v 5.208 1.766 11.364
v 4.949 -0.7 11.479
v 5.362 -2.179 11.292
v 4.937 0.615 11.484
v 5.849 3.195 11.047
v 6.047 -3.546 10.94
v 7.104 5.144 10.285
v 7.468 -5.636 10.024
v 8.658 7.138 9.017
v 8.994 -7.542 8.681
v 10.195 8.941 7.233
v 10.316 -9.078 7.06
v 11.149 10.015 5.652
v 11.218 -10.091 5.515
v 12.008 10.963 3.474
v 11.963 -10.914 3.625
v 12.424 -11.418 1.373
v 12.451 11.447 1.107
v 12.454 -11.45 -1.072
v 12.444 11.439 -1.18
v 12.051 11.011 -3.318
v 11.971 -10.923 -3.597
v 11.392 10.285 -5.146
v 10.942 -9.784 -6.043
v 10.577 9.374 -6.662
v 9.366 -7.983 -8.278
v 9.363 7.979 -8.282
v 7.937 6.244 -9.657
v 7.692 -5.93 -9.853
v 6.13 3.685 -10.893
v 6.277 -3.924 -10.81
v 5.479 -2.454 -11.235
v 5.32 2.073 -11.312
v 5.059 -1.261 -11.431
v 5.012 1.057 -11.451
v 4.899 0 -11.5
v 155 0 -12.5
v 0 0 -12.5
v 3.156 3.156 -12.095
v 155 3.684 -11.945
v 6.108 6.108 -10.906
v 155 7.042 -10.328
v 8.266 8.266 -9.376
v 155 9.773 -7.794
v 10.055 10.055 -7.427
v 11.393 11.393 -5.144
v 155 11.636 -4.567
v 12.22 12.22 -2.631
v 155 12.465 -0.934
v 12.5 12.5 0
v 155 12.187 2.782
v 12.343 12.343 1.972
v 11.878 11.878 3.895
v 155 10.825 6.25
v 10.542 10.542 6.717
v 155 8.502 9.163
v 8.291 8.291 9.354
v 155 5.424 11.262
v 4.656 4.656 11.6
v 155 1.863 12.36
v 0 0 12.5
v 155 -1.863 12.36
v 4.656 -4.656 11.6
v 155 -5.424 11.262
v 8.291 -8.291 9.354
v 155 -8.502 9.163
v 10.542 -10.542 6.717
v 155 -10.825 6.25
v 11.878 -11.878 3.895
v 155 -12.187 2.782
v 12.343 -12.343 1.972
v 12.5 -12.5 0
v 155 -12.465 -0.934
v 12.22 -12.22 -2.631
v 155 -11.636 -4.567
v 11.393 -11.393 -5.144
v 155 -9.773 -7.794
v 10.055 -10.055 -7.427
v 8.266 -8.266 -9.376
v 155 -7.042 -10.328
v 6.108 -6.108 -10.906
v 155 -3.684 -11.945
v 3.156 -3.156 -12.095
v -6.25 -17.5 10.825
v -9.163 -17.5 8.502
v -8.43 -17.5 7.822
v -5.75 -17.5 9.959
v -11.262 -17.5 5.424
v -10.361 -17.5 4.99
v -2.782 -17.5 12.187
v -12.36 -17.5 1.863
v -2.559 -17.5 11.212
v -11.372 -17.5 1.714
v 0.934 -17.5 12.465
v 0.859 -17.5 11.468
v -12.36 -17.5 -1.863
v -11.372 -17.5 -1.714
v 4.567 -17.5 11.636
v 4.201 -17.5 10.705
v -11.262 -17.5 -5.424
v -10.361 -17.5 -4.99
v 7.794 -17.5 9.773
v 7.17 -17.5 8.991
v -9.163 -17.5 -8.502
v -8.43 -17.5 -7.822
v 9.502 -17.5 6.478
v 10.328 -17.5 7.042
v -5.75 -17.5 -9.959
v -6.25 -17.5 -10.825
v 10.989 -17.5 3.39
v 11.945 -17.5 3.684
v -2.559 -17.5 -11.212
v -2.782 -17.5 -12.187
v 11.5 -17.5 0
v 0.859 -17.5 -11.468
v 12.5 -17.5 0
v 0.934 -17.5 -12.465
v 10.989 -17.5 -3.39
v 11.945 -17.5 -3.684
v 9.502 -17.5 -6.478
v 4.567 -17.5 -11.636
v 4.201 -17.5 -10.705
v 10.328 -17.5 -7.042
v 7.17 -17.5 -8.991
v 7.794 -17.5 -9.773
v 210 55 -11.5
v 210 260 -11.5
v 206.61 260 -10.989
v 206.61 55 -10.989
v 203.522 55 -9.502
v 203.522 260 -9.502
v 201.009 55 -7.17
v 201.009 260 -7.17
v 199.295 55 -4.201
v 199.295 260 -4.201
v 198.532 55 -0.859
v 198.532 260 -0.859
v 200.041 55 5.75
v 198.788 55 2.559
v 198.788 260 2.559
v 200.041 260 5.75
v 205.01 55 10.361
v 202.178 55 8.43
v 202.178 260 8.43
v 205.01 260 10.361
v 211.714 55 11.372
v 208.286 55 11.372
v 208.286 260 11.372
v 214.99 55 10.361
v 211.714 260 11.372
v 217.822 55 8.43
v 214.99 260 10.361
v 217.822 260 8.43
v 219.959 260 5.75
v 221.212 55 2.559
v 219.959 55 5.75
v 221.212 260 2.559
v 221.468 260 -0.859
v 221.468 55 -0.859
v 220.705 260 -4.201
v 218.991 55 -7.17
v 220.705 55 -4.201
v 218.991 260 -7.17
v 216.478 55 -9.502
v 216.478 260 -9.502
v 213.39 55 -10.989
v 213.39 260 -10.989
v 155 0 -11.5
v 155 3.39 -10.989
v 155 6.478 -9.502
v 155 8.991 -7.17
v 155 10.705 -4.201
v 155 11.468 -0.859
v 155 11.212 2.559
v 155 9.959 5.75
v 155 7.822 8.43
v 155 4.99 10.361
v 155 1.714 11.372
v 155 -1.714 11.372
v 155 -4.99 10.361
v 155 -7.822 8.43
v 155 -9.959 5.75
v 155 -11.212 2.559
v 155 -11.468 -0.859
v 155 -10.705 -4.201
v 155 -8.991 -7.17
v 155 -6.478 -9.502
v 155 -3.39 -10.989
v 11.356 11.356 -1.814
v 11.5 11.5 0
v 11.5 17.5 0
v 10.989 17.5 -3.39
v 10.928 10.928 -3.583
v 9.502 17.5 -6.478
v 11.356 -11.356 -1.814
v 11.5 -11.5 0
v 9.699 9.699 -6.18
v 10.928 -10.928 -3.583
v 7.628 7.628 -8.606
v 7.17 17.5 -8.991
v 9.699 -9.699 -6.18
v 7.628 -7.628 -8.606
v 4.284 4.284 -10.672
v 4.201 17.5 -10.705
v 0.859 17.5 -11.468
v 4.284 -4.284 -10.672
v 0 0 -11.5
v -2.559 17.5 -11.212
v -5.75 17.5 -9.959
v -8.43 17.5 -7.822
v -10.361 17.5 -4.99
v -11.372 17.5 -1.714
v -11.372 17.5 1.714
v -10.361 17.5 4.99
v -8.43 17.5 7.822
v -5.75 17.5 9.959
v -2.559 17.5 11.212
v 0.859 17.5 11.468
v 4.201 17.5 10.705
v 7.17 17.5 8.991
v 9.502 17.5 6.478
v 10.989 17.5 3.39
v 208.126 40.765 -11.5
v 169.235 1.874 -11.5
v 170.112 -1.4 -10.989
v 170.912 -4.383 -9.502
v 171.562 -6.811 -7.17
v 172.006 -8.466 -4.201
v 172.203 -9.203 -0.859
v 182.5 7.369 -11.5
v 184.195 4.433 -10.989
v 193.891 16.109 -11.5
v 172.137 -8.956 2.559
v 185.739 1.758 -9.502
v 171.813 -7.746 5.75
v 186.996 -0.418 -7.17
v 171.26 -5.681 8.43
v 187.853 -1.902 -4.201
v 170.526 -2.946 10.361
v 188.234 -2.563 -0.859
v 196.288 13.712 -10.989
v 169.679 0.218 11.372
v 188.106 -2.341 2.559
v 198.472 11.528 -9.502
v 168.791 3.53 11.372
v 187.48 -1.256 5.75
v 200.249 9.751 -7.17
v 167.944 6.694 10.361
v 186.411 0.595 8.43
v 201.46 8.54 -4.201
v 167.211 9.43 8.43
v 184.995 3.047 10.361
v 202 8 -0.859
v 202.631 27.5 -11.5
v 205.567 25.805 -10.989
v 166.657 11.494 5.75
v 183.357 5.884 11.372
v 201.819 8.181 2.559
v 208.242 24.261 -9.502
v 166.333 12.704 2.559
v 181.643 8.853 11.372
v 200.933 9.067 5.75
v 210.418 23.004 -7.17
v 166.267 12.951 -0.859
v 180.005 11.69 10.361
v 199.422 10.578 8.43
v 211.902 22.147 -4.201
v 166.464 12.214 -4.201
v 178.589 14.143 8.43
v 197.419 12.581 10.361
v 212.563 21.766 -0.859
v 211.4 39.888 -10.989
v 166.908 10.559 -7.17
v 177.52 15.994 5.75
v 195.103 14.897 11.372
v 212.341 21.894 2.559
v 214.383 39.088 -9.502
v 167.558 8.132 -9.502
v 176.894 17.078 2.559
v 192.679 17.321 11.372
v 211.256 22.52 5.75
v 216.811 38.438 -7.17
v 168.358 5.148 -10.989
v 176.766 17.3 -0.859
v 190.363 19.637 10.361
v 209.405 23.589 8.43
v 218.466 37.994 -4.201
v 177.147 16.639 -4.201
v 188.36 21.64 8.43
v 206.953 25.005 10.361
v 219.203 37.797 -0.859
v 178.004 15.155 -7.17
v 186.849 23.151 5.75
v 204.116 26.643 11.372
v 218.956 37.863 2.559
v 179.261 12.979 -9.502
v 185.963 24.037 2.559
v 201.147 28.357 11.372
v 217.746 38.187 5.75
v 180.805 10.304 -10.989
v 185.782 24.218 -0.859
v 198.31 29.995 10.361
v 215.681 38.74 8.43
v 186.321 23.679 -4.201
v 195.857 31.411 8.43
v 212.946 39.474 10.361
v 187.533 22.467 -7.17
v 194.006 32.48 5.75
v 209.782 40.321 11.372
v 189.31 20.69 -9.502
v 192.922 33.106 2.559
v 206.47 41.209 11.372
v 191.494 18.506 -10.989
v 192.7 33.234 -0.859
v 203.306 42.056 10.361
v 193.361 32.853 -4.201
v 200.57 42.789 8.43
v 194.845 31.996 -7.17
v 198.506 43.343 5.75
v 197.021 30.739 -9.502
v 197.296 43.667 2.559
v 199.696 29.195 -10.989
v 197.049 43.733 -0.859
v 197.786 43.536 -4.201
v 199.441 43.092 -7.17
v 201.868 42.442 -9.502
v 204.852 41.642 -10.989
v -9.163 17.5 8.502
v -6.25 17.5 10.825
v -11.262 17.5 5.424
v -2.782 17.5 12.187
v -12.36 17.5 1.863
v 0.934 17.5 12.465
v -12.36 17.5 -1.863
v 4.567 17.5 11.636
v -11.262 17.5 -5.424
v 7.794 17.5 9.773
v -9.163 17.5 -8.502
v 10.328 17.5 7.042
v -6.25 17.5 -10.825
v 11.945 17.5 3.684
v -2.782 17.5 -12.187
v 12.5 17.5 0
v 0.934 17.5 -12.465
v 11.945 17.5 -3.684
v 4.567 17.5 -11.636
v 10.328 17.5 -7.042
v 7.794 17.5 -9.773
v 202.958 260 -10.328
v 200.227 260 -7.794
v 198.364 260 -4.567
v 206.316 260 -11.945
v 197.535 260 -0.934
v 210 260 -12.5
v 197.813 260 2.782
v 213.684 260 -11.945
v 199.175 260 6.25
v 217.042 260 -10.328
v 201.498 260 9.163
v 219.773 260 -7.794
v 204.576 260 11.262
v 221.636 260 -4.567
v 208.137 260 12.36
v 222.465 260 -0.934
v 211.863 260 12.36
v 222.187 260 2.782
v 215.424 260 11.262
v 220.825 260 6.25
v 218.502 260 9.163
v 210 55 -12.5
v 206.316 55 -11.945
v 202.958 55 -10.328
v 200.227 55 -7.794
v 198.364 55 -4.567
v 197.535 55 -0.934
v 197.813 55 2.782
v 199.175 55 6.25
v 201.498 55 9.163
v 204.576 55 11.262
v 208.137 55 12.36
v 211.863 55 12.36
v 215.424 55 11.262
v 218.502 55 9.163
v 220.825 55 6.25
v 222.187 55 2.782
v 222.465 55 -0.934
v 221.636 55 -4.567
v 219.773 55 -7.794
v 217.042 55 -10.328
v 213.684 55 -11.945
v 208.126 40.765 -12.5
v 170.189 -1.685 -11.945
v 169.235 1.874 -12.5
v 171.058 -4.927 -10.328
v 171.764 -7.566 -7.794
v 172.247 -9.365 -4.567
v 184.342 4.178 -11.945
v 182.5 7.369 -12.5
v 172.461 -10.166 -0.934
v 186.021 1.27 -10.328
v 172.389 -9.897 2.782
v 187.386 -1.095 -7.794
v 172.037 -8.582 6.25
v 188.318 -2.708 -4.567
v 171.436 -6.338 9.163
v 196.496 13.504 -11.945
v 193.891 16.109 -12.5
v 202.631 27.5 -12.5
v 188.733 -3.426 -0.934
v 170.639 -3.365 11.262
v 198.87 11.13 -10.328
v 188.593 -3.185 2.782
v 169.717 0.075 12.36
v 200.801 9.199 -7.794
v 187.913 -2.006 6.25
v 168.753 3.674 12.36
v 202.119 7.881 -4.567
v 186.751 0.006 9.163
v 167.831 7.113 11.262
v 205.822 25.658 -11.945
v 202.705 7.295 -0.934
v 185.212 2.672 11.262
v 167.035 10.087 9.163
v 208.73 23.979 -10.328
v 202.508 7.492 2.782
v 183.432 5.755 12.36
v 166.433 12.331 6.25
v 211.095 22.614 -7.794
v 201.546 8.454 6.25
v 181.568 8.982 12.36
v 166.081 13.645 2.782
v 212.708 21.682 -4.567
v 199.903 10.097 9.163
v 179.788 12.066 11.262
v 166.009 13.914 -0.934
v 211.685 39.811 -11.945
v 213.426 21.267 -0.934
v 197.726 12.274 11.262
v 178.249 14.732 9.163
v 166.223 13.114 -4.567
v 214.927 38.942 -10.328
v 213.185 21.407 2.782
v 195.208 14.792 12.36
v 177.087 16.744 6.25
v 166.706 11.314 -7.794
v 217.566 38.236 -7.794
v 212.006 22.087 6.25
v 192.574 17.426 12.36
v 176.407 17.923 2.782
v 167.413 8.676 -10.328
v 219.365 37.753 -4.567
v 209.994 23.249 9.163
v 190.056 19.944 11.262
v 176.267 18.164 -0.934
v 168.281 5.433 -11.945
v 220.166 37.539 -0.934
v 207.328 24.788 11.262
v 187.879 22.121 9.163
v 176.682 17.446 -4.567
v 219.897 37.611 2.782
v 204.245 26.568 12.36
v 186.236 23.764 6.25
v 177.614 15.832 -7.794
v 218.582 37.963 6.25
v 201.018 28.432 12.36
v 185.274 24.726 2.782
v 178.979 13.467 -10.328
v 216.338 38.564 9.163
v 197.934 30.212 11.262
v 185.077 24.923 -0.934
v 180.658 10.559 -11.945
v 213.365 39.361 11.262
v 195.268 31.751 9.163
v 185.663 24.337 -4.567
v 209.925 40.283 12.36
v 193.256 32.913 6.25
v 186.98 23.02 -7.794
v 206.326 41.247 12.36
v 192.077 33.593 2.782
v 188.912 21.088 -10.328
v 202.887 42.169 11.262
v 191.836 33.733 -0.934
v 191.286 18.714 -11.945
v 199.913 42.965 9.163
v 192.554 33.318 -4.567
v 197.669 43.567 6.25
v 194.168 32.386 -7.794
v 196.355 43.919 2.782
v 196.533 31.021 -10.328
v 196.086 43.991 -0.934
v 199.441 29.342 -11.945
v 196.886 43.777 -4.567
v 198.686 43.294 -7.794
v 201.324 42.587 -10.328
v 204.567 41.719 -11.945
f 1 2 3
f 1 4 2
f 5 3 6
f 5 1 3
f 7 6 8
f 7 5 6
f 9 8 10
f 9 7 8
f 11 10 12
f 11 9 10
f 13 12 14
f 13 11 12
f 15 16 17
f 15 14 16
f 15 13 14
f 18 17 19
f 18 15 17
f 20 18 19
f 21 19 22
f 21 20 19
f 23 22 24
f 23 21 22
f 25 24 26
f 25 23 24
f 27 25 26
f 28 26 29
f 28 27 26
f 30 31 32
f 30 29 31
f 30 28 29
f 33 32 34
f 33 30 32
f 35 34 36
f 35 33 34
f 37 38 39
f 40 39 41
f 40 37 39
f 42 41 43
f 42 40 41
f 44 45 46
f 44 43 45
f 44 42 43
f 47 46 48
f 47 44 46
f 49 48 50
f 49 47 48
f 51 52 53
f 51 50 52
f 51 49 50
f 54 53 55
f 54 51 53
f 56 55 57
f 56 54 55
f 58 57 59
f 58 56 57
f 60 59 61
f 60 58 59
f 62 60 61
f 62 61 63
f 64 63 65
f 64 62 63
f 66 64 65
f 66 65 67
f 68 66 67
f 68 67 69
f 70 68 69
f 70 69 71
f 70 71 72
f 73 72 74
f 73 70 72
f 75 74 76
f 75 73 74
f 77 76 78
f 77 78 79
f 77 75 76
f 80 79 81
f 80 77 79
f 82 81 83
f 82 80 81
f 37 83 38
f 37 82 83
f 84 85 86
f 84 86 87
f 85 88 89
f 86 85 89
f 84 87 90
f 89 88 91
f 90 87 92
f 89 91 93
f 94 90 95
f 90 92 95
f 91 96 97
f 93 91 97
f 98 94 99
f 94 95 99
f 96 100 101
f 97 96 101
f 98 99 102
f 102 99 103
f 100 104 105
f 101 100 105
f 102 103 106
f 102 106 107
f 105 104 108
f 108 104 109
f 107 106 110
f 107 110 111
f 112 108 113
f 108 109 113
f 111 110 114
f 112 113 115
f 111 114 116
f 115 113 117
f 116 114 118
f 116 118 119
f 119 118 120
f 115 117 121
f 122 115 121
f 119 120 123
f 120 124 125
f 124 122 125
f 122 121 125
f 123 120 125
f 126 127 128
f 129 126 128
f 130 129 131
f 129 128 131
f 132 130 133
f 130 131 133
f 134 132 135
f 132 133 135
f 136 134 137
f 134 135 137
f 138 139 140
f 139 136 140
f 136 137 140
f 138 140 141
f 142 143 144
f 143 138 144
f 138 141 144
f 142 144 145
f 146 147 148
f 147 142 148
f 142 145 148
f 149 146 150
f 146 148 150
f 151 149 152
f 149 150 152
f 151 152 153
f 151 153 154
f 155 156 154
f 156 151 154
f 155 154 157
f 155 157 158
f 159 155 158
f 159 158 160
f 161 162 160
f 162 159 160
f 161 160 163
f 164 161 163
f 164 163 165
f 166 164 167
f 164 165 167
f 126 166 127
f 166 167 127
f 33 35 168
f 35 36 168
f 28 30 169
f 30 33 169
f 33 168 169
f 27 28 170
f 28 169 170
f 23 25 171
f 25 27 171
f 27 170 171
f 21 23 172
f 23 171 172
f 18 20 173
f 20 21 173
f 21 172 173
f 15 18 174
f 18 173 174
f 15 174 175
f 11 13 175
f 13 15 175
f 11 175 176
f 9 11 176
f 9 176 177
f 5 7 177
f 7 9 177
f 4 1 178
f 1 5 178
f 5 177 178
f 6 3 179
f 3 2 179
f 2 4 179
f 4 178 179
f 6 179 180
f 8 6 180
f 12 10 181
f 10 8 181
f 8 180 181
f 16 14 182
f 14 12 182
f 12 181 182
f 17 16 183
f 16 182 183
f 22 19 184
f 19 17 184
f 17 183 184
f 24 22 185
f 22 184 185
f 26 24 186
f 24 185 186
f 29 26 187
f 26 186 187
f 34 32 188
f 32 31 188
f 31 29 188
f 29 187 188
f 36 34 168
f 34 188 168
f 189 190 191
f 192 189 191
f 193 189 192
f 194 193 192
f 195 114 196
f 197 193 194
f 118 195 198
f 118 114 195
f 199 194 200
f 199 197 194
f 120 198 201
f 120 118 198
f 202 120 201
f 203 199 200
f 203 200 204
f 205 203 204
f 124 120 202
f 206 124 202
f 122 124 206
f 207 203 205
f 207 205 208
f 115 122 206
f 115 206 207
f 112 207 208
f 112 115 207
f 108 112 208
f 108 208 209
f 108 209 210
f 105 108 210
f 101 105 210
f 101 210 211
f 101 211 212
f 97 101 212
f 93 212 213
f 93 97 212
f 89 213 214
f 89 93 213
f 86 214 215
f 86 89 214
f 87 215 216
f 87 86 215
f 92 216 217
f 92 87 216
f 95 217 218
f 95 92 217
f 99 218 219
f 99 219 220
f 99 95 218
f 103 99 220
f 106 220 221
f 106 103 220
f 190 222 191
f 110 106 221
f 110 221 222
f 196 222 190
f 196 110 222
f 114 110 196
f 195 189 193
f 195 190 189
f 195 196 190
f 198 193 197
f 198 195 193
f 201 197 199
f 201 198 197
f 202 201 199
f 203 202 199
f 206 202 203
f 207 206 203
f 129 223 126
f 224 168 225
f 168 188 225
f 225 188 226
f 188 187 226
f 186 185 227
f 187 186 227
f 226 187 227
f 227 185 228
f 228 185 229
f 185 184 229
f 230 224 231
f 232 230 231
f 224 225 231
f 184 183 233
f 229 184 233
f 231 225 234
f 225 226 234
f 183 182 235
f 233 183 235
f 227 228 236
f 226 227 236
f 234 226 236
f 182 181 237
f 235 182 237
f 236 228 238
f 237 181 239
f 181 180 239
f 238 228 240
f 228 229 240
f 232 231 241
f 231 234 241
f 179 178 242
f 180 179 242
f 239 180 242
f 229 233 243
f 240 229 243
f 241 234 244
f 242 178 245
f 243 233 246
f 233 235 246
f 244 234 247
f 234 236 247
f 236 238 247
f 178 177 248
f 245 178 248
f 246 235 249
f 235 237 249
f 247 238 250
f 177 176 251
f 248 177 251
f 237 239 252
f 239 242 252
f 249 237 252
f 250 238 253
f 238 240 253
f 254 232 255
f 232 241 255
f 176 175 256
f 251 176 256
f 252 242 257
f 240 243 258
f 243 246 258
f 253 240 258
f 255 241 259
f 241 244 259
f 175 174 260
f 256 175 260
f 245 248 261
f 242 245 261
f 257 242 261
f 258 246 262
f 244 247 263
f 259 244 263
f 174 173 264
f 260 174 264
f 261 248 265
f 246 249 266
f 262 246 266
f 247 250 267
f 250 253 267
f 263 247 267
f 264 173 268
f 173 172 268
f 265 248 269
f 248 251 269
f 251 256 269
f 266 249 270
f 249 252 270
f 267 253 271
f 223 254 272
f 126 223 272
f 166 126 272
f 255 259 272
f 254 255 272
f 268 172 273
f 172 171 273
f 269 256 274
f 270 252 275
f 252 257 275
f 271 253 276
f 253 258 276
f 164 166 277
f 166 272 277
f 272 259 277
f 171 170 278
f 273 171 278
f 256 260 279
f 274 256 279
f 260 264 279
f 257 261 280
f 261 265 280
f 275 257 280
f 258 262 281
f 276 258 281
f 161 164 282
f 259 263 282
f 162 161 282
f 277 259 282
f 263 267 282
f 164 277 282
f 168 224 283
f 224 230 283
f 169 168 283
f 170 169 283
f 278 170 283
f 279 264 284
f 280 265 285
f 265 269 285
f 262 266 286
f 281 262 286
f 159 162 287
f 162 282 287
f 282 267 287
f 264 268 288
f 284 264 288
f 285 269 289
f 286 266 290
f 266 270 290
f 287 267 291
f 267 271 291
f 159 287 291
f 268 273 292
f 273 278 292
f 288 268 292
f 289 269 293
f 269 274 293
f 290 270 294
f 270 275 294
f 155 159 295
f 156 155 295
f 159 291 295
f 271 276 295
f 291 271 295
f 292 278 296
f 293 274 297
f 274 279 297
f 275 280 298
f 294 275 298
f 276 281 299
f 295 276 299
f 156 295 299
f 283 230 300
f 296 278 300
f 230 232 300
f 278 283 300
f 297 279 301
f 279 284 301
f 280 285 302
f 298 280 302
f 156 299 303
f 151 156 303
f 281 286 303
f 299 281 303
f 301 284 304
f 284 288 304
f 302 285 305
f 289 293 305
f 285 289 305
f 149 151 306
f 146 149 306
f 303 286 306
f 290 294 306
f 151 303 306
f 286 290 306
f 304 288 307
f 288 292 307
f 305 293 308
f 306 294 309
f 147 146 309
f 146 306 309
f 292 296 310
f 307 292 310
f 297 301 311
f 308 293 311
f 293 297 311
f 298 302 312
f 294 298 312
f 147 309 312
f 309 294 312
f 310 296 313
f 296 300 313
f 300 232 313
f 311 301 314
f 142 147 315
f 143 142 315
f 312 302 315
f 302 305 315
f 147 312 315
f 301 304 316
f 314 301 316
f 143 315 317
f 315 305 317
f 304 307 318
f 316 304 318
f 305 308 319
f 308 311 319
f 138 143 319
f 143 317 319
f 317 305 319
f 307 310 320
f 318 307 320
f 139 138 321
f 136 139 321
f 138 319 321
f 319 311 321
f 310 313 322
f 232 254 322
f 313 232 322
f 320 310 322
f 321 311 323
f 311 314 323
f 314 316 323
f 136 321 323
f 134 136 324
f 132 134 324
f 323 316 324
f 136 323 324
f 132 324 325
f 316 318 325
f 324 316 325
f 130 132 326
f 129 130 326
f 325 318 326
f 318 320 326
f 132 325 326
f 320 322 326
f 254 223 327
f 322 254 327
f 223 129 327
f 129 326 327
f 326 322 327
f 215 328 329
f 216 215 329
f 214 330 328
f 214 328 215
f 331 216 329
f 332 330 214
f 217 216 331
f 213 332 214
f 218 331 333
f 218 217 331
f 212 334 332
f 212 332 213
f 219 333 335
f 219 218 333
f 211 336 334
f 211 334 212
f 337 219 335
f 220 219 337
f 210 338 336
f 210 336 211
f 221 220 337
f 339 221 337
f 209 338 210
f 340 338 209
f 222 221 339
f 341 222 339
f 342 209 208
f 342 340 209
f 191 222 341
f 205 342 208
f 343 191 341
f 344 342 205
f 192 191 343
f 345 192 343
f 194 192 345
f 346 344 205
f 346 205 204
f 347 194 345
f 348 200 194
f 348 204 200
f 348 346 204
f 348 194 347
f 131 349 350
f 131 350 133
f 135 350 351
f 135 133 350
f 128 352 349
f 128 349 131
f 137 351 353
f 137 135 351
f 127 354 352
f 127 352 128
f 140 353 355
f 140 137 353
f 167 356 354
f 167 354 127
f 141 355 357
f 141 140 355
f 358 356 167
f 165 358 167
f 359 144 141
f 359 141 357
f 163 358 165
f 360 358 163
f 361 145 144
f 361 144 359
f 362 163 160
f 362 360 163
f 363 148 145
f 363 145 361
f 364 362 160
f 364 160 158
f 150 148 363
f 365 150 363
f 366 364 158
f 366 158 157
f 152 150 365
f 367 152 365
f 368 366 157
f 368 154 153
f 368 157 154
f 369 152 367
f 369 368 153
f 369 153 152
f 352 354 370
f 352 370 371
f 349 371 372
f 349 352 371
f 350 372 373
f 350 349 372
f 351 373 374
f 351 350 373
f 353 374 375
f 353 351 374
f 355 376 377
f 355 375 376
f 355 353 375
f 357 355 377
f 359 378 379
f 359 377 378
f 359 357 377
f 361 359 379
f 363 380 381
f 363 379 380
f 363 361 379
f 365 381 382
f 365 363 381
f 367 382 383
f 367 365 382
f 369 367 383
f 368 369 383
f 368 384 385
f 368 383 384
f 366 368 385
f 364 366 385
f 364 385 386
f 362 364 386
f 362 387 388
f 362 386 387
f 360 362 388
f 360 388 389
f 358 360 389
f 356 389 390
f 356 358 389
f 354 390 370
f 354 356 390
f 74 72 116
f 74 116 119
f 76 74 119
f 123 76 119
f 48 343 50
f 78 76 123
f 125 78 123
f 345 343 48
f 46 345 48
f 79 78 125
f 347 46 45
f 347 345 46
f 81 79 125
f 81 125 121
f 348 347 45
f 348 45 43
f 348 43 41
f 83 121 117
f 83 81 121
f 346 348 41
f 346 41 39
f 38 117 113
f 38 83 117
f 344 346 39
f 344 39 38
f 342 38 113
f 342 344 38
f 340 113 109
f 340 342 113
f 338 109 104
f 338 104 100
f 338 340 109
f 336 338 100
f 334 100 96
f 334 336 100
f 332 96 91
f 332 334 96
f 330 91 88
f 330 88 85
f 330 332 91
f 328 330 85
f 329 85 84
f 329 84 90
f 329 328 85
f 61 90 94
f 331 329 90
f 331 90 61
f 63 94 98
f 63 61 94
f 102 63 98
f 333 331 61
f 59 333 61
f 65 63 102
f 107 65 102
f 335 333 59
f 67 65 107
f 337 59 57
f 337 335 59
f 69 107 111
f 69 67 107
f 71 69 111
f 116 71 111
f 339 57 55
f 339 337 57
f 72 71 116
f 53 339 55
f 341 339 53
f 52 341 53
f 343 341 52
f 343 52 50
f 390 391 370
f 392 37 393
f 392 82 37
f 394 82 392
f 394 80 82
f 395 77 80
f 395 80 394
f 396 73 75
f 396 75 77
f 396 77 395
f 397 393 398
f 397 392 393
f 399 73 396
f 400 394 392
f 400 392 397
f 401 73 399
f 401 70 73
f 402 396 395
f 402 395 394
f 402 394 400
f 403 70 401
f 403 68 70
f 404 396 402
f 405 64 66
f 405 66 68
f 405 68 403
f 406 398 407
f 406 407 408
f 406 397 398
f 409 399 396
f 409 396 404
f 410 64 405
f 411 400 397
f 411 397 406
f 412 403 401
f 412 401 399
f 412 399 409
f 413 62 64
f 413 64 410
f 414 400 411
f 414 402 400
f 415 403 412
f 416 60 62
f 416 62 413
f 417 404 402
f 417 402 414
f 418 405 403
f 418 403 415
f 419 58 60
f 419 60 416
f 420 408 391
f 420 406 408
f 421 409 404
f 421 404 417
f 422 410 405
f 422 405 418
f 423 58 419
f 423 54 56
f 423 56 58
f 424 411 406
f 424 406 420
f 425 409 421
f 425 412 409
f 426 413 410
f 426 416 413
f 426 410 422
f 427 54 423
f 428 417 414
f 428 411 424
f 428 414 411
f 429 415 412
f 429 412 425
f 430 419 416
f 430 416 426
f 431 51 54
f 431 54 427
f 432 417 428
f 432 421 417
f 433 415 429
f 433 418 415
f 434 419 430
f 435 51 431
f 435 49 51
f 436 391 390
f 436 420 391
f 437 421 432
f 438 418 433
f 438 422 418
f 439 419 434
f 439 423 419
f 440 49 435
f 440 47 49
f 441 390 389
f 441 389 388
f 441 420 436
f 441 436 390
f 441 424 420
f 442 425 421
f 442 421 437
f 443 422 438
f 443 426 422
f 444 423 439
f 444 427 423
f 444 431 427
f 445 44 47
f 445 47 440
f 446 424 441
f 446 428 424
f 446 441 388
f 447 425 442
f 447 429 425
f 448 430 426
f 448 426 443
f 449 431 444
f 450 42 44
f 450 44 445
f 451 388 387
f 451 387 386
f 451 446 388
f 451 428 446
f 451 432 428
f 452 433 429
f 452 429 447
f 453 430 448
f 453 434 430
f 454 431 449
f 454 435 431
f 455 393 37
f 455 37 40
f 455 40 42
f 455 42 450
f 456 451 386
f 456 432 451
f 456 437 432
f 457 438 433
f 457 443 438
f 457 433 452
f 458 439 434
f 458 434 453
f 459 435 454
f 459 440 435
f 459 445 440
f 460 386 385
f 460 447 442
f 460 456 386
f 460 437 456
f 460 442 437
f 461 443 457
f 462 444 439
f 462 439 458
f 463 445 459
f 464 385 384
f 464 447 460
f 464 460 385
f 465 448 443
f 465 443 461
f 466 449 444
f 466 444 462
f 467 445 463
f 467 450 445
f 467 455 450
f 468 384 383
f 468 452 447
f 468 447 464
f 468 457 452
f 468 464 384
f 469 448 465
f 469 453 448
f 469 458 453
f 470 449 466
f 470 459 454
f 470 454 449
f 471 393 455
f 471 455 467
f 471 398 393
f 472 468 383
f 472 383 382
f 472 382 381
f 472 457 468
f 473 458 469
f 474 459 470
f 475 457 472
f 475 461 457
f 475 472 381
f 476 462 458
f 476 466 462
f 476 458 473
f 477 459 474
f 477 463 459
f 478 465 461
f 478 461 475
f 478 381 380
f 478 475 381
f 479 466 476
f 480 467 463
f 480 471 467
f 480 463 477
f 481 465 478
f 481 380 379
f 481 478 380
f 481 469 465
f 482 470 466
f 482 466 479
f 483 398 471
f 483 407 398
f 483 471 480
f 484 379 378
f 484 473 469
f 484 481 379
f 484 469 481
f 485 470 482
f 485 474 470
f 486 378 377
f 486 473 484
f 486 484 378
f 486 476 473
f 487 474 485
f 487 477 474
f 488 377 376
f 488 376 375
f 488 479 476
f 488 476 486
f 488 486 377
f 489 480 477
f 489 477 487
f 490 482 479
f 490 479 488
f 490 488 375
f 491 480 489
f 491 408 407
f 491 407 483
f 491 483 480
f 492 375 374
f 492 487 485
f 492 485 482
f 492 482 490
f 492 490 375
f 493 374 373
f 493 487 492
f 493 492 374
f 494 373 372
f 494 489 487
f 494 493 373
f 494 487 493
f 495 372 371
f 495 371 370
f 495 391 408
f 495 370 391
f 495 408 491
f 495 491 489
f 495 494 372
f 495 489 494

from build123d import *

# Parameters (mm, degrees)
SKETCH_1_R          = 12.5
SKETCH_1_R_2        = 11.5
EXTRUDE_1_DEPTH     = 17.5
SKETCH_2_R          = 12.5
SKETCH_2_R_2        = 11.5
SKETCH_1_3_R        = 11.5
CUT_EXTRUDE_2_DEPTH = 400


with BuildPart() as part:
    # 草圖1 → 填料-伸長1 (new, symmetric)
    with BuildSketch(Plane(origin=(0, 0, 0), x_dir=(1, 0, 0), z_dir=(0, 1, 0))):
        Circle(SKETCH_1_R)
        Circle(SKETCH_1_R_2, mode=Mode.SUBTRACT)
    extrude(amount=EXTRUDE_1_DEPTH, both=True)

    # 掃出1: sweep along a path in 草圖6
    with BuildLine(Plane.XY) as sweep_1_path:
        Line((0, 0), (155, 0))
        ThreePointArc((155, 0), (193.890872965, 16.109127035), (210, 55))
        Line((210, 55), (210, 260))
    # 草圖2 → 掃出1 (sweep)
    with BuildSketch(Plane(origin=(0, 0, 0), x_dir=(0, 0, -1), z_dir=(1, 0, 0))):
        Circle(SKETCH_2_R)
        Circle(SKETCH_2_R_2, mode=Mode.SUBTRACT)
    sweep(path=sweep_1_path.line)

    # 草圖1<3> → 除料-伸長2 (cut, symmetric)
    with BuildSketch(Plane(origin=(0, 0, 0), x_dir=(1, 0, 0), z_dir=(0, 1, 0))):
        Circle(SKETCH_1_3_R)
    extrude(amount=CUT_EXTRUDE_2_DEPTH, both=True, mode=Mode.SUBTRACT)


solid = part.part
